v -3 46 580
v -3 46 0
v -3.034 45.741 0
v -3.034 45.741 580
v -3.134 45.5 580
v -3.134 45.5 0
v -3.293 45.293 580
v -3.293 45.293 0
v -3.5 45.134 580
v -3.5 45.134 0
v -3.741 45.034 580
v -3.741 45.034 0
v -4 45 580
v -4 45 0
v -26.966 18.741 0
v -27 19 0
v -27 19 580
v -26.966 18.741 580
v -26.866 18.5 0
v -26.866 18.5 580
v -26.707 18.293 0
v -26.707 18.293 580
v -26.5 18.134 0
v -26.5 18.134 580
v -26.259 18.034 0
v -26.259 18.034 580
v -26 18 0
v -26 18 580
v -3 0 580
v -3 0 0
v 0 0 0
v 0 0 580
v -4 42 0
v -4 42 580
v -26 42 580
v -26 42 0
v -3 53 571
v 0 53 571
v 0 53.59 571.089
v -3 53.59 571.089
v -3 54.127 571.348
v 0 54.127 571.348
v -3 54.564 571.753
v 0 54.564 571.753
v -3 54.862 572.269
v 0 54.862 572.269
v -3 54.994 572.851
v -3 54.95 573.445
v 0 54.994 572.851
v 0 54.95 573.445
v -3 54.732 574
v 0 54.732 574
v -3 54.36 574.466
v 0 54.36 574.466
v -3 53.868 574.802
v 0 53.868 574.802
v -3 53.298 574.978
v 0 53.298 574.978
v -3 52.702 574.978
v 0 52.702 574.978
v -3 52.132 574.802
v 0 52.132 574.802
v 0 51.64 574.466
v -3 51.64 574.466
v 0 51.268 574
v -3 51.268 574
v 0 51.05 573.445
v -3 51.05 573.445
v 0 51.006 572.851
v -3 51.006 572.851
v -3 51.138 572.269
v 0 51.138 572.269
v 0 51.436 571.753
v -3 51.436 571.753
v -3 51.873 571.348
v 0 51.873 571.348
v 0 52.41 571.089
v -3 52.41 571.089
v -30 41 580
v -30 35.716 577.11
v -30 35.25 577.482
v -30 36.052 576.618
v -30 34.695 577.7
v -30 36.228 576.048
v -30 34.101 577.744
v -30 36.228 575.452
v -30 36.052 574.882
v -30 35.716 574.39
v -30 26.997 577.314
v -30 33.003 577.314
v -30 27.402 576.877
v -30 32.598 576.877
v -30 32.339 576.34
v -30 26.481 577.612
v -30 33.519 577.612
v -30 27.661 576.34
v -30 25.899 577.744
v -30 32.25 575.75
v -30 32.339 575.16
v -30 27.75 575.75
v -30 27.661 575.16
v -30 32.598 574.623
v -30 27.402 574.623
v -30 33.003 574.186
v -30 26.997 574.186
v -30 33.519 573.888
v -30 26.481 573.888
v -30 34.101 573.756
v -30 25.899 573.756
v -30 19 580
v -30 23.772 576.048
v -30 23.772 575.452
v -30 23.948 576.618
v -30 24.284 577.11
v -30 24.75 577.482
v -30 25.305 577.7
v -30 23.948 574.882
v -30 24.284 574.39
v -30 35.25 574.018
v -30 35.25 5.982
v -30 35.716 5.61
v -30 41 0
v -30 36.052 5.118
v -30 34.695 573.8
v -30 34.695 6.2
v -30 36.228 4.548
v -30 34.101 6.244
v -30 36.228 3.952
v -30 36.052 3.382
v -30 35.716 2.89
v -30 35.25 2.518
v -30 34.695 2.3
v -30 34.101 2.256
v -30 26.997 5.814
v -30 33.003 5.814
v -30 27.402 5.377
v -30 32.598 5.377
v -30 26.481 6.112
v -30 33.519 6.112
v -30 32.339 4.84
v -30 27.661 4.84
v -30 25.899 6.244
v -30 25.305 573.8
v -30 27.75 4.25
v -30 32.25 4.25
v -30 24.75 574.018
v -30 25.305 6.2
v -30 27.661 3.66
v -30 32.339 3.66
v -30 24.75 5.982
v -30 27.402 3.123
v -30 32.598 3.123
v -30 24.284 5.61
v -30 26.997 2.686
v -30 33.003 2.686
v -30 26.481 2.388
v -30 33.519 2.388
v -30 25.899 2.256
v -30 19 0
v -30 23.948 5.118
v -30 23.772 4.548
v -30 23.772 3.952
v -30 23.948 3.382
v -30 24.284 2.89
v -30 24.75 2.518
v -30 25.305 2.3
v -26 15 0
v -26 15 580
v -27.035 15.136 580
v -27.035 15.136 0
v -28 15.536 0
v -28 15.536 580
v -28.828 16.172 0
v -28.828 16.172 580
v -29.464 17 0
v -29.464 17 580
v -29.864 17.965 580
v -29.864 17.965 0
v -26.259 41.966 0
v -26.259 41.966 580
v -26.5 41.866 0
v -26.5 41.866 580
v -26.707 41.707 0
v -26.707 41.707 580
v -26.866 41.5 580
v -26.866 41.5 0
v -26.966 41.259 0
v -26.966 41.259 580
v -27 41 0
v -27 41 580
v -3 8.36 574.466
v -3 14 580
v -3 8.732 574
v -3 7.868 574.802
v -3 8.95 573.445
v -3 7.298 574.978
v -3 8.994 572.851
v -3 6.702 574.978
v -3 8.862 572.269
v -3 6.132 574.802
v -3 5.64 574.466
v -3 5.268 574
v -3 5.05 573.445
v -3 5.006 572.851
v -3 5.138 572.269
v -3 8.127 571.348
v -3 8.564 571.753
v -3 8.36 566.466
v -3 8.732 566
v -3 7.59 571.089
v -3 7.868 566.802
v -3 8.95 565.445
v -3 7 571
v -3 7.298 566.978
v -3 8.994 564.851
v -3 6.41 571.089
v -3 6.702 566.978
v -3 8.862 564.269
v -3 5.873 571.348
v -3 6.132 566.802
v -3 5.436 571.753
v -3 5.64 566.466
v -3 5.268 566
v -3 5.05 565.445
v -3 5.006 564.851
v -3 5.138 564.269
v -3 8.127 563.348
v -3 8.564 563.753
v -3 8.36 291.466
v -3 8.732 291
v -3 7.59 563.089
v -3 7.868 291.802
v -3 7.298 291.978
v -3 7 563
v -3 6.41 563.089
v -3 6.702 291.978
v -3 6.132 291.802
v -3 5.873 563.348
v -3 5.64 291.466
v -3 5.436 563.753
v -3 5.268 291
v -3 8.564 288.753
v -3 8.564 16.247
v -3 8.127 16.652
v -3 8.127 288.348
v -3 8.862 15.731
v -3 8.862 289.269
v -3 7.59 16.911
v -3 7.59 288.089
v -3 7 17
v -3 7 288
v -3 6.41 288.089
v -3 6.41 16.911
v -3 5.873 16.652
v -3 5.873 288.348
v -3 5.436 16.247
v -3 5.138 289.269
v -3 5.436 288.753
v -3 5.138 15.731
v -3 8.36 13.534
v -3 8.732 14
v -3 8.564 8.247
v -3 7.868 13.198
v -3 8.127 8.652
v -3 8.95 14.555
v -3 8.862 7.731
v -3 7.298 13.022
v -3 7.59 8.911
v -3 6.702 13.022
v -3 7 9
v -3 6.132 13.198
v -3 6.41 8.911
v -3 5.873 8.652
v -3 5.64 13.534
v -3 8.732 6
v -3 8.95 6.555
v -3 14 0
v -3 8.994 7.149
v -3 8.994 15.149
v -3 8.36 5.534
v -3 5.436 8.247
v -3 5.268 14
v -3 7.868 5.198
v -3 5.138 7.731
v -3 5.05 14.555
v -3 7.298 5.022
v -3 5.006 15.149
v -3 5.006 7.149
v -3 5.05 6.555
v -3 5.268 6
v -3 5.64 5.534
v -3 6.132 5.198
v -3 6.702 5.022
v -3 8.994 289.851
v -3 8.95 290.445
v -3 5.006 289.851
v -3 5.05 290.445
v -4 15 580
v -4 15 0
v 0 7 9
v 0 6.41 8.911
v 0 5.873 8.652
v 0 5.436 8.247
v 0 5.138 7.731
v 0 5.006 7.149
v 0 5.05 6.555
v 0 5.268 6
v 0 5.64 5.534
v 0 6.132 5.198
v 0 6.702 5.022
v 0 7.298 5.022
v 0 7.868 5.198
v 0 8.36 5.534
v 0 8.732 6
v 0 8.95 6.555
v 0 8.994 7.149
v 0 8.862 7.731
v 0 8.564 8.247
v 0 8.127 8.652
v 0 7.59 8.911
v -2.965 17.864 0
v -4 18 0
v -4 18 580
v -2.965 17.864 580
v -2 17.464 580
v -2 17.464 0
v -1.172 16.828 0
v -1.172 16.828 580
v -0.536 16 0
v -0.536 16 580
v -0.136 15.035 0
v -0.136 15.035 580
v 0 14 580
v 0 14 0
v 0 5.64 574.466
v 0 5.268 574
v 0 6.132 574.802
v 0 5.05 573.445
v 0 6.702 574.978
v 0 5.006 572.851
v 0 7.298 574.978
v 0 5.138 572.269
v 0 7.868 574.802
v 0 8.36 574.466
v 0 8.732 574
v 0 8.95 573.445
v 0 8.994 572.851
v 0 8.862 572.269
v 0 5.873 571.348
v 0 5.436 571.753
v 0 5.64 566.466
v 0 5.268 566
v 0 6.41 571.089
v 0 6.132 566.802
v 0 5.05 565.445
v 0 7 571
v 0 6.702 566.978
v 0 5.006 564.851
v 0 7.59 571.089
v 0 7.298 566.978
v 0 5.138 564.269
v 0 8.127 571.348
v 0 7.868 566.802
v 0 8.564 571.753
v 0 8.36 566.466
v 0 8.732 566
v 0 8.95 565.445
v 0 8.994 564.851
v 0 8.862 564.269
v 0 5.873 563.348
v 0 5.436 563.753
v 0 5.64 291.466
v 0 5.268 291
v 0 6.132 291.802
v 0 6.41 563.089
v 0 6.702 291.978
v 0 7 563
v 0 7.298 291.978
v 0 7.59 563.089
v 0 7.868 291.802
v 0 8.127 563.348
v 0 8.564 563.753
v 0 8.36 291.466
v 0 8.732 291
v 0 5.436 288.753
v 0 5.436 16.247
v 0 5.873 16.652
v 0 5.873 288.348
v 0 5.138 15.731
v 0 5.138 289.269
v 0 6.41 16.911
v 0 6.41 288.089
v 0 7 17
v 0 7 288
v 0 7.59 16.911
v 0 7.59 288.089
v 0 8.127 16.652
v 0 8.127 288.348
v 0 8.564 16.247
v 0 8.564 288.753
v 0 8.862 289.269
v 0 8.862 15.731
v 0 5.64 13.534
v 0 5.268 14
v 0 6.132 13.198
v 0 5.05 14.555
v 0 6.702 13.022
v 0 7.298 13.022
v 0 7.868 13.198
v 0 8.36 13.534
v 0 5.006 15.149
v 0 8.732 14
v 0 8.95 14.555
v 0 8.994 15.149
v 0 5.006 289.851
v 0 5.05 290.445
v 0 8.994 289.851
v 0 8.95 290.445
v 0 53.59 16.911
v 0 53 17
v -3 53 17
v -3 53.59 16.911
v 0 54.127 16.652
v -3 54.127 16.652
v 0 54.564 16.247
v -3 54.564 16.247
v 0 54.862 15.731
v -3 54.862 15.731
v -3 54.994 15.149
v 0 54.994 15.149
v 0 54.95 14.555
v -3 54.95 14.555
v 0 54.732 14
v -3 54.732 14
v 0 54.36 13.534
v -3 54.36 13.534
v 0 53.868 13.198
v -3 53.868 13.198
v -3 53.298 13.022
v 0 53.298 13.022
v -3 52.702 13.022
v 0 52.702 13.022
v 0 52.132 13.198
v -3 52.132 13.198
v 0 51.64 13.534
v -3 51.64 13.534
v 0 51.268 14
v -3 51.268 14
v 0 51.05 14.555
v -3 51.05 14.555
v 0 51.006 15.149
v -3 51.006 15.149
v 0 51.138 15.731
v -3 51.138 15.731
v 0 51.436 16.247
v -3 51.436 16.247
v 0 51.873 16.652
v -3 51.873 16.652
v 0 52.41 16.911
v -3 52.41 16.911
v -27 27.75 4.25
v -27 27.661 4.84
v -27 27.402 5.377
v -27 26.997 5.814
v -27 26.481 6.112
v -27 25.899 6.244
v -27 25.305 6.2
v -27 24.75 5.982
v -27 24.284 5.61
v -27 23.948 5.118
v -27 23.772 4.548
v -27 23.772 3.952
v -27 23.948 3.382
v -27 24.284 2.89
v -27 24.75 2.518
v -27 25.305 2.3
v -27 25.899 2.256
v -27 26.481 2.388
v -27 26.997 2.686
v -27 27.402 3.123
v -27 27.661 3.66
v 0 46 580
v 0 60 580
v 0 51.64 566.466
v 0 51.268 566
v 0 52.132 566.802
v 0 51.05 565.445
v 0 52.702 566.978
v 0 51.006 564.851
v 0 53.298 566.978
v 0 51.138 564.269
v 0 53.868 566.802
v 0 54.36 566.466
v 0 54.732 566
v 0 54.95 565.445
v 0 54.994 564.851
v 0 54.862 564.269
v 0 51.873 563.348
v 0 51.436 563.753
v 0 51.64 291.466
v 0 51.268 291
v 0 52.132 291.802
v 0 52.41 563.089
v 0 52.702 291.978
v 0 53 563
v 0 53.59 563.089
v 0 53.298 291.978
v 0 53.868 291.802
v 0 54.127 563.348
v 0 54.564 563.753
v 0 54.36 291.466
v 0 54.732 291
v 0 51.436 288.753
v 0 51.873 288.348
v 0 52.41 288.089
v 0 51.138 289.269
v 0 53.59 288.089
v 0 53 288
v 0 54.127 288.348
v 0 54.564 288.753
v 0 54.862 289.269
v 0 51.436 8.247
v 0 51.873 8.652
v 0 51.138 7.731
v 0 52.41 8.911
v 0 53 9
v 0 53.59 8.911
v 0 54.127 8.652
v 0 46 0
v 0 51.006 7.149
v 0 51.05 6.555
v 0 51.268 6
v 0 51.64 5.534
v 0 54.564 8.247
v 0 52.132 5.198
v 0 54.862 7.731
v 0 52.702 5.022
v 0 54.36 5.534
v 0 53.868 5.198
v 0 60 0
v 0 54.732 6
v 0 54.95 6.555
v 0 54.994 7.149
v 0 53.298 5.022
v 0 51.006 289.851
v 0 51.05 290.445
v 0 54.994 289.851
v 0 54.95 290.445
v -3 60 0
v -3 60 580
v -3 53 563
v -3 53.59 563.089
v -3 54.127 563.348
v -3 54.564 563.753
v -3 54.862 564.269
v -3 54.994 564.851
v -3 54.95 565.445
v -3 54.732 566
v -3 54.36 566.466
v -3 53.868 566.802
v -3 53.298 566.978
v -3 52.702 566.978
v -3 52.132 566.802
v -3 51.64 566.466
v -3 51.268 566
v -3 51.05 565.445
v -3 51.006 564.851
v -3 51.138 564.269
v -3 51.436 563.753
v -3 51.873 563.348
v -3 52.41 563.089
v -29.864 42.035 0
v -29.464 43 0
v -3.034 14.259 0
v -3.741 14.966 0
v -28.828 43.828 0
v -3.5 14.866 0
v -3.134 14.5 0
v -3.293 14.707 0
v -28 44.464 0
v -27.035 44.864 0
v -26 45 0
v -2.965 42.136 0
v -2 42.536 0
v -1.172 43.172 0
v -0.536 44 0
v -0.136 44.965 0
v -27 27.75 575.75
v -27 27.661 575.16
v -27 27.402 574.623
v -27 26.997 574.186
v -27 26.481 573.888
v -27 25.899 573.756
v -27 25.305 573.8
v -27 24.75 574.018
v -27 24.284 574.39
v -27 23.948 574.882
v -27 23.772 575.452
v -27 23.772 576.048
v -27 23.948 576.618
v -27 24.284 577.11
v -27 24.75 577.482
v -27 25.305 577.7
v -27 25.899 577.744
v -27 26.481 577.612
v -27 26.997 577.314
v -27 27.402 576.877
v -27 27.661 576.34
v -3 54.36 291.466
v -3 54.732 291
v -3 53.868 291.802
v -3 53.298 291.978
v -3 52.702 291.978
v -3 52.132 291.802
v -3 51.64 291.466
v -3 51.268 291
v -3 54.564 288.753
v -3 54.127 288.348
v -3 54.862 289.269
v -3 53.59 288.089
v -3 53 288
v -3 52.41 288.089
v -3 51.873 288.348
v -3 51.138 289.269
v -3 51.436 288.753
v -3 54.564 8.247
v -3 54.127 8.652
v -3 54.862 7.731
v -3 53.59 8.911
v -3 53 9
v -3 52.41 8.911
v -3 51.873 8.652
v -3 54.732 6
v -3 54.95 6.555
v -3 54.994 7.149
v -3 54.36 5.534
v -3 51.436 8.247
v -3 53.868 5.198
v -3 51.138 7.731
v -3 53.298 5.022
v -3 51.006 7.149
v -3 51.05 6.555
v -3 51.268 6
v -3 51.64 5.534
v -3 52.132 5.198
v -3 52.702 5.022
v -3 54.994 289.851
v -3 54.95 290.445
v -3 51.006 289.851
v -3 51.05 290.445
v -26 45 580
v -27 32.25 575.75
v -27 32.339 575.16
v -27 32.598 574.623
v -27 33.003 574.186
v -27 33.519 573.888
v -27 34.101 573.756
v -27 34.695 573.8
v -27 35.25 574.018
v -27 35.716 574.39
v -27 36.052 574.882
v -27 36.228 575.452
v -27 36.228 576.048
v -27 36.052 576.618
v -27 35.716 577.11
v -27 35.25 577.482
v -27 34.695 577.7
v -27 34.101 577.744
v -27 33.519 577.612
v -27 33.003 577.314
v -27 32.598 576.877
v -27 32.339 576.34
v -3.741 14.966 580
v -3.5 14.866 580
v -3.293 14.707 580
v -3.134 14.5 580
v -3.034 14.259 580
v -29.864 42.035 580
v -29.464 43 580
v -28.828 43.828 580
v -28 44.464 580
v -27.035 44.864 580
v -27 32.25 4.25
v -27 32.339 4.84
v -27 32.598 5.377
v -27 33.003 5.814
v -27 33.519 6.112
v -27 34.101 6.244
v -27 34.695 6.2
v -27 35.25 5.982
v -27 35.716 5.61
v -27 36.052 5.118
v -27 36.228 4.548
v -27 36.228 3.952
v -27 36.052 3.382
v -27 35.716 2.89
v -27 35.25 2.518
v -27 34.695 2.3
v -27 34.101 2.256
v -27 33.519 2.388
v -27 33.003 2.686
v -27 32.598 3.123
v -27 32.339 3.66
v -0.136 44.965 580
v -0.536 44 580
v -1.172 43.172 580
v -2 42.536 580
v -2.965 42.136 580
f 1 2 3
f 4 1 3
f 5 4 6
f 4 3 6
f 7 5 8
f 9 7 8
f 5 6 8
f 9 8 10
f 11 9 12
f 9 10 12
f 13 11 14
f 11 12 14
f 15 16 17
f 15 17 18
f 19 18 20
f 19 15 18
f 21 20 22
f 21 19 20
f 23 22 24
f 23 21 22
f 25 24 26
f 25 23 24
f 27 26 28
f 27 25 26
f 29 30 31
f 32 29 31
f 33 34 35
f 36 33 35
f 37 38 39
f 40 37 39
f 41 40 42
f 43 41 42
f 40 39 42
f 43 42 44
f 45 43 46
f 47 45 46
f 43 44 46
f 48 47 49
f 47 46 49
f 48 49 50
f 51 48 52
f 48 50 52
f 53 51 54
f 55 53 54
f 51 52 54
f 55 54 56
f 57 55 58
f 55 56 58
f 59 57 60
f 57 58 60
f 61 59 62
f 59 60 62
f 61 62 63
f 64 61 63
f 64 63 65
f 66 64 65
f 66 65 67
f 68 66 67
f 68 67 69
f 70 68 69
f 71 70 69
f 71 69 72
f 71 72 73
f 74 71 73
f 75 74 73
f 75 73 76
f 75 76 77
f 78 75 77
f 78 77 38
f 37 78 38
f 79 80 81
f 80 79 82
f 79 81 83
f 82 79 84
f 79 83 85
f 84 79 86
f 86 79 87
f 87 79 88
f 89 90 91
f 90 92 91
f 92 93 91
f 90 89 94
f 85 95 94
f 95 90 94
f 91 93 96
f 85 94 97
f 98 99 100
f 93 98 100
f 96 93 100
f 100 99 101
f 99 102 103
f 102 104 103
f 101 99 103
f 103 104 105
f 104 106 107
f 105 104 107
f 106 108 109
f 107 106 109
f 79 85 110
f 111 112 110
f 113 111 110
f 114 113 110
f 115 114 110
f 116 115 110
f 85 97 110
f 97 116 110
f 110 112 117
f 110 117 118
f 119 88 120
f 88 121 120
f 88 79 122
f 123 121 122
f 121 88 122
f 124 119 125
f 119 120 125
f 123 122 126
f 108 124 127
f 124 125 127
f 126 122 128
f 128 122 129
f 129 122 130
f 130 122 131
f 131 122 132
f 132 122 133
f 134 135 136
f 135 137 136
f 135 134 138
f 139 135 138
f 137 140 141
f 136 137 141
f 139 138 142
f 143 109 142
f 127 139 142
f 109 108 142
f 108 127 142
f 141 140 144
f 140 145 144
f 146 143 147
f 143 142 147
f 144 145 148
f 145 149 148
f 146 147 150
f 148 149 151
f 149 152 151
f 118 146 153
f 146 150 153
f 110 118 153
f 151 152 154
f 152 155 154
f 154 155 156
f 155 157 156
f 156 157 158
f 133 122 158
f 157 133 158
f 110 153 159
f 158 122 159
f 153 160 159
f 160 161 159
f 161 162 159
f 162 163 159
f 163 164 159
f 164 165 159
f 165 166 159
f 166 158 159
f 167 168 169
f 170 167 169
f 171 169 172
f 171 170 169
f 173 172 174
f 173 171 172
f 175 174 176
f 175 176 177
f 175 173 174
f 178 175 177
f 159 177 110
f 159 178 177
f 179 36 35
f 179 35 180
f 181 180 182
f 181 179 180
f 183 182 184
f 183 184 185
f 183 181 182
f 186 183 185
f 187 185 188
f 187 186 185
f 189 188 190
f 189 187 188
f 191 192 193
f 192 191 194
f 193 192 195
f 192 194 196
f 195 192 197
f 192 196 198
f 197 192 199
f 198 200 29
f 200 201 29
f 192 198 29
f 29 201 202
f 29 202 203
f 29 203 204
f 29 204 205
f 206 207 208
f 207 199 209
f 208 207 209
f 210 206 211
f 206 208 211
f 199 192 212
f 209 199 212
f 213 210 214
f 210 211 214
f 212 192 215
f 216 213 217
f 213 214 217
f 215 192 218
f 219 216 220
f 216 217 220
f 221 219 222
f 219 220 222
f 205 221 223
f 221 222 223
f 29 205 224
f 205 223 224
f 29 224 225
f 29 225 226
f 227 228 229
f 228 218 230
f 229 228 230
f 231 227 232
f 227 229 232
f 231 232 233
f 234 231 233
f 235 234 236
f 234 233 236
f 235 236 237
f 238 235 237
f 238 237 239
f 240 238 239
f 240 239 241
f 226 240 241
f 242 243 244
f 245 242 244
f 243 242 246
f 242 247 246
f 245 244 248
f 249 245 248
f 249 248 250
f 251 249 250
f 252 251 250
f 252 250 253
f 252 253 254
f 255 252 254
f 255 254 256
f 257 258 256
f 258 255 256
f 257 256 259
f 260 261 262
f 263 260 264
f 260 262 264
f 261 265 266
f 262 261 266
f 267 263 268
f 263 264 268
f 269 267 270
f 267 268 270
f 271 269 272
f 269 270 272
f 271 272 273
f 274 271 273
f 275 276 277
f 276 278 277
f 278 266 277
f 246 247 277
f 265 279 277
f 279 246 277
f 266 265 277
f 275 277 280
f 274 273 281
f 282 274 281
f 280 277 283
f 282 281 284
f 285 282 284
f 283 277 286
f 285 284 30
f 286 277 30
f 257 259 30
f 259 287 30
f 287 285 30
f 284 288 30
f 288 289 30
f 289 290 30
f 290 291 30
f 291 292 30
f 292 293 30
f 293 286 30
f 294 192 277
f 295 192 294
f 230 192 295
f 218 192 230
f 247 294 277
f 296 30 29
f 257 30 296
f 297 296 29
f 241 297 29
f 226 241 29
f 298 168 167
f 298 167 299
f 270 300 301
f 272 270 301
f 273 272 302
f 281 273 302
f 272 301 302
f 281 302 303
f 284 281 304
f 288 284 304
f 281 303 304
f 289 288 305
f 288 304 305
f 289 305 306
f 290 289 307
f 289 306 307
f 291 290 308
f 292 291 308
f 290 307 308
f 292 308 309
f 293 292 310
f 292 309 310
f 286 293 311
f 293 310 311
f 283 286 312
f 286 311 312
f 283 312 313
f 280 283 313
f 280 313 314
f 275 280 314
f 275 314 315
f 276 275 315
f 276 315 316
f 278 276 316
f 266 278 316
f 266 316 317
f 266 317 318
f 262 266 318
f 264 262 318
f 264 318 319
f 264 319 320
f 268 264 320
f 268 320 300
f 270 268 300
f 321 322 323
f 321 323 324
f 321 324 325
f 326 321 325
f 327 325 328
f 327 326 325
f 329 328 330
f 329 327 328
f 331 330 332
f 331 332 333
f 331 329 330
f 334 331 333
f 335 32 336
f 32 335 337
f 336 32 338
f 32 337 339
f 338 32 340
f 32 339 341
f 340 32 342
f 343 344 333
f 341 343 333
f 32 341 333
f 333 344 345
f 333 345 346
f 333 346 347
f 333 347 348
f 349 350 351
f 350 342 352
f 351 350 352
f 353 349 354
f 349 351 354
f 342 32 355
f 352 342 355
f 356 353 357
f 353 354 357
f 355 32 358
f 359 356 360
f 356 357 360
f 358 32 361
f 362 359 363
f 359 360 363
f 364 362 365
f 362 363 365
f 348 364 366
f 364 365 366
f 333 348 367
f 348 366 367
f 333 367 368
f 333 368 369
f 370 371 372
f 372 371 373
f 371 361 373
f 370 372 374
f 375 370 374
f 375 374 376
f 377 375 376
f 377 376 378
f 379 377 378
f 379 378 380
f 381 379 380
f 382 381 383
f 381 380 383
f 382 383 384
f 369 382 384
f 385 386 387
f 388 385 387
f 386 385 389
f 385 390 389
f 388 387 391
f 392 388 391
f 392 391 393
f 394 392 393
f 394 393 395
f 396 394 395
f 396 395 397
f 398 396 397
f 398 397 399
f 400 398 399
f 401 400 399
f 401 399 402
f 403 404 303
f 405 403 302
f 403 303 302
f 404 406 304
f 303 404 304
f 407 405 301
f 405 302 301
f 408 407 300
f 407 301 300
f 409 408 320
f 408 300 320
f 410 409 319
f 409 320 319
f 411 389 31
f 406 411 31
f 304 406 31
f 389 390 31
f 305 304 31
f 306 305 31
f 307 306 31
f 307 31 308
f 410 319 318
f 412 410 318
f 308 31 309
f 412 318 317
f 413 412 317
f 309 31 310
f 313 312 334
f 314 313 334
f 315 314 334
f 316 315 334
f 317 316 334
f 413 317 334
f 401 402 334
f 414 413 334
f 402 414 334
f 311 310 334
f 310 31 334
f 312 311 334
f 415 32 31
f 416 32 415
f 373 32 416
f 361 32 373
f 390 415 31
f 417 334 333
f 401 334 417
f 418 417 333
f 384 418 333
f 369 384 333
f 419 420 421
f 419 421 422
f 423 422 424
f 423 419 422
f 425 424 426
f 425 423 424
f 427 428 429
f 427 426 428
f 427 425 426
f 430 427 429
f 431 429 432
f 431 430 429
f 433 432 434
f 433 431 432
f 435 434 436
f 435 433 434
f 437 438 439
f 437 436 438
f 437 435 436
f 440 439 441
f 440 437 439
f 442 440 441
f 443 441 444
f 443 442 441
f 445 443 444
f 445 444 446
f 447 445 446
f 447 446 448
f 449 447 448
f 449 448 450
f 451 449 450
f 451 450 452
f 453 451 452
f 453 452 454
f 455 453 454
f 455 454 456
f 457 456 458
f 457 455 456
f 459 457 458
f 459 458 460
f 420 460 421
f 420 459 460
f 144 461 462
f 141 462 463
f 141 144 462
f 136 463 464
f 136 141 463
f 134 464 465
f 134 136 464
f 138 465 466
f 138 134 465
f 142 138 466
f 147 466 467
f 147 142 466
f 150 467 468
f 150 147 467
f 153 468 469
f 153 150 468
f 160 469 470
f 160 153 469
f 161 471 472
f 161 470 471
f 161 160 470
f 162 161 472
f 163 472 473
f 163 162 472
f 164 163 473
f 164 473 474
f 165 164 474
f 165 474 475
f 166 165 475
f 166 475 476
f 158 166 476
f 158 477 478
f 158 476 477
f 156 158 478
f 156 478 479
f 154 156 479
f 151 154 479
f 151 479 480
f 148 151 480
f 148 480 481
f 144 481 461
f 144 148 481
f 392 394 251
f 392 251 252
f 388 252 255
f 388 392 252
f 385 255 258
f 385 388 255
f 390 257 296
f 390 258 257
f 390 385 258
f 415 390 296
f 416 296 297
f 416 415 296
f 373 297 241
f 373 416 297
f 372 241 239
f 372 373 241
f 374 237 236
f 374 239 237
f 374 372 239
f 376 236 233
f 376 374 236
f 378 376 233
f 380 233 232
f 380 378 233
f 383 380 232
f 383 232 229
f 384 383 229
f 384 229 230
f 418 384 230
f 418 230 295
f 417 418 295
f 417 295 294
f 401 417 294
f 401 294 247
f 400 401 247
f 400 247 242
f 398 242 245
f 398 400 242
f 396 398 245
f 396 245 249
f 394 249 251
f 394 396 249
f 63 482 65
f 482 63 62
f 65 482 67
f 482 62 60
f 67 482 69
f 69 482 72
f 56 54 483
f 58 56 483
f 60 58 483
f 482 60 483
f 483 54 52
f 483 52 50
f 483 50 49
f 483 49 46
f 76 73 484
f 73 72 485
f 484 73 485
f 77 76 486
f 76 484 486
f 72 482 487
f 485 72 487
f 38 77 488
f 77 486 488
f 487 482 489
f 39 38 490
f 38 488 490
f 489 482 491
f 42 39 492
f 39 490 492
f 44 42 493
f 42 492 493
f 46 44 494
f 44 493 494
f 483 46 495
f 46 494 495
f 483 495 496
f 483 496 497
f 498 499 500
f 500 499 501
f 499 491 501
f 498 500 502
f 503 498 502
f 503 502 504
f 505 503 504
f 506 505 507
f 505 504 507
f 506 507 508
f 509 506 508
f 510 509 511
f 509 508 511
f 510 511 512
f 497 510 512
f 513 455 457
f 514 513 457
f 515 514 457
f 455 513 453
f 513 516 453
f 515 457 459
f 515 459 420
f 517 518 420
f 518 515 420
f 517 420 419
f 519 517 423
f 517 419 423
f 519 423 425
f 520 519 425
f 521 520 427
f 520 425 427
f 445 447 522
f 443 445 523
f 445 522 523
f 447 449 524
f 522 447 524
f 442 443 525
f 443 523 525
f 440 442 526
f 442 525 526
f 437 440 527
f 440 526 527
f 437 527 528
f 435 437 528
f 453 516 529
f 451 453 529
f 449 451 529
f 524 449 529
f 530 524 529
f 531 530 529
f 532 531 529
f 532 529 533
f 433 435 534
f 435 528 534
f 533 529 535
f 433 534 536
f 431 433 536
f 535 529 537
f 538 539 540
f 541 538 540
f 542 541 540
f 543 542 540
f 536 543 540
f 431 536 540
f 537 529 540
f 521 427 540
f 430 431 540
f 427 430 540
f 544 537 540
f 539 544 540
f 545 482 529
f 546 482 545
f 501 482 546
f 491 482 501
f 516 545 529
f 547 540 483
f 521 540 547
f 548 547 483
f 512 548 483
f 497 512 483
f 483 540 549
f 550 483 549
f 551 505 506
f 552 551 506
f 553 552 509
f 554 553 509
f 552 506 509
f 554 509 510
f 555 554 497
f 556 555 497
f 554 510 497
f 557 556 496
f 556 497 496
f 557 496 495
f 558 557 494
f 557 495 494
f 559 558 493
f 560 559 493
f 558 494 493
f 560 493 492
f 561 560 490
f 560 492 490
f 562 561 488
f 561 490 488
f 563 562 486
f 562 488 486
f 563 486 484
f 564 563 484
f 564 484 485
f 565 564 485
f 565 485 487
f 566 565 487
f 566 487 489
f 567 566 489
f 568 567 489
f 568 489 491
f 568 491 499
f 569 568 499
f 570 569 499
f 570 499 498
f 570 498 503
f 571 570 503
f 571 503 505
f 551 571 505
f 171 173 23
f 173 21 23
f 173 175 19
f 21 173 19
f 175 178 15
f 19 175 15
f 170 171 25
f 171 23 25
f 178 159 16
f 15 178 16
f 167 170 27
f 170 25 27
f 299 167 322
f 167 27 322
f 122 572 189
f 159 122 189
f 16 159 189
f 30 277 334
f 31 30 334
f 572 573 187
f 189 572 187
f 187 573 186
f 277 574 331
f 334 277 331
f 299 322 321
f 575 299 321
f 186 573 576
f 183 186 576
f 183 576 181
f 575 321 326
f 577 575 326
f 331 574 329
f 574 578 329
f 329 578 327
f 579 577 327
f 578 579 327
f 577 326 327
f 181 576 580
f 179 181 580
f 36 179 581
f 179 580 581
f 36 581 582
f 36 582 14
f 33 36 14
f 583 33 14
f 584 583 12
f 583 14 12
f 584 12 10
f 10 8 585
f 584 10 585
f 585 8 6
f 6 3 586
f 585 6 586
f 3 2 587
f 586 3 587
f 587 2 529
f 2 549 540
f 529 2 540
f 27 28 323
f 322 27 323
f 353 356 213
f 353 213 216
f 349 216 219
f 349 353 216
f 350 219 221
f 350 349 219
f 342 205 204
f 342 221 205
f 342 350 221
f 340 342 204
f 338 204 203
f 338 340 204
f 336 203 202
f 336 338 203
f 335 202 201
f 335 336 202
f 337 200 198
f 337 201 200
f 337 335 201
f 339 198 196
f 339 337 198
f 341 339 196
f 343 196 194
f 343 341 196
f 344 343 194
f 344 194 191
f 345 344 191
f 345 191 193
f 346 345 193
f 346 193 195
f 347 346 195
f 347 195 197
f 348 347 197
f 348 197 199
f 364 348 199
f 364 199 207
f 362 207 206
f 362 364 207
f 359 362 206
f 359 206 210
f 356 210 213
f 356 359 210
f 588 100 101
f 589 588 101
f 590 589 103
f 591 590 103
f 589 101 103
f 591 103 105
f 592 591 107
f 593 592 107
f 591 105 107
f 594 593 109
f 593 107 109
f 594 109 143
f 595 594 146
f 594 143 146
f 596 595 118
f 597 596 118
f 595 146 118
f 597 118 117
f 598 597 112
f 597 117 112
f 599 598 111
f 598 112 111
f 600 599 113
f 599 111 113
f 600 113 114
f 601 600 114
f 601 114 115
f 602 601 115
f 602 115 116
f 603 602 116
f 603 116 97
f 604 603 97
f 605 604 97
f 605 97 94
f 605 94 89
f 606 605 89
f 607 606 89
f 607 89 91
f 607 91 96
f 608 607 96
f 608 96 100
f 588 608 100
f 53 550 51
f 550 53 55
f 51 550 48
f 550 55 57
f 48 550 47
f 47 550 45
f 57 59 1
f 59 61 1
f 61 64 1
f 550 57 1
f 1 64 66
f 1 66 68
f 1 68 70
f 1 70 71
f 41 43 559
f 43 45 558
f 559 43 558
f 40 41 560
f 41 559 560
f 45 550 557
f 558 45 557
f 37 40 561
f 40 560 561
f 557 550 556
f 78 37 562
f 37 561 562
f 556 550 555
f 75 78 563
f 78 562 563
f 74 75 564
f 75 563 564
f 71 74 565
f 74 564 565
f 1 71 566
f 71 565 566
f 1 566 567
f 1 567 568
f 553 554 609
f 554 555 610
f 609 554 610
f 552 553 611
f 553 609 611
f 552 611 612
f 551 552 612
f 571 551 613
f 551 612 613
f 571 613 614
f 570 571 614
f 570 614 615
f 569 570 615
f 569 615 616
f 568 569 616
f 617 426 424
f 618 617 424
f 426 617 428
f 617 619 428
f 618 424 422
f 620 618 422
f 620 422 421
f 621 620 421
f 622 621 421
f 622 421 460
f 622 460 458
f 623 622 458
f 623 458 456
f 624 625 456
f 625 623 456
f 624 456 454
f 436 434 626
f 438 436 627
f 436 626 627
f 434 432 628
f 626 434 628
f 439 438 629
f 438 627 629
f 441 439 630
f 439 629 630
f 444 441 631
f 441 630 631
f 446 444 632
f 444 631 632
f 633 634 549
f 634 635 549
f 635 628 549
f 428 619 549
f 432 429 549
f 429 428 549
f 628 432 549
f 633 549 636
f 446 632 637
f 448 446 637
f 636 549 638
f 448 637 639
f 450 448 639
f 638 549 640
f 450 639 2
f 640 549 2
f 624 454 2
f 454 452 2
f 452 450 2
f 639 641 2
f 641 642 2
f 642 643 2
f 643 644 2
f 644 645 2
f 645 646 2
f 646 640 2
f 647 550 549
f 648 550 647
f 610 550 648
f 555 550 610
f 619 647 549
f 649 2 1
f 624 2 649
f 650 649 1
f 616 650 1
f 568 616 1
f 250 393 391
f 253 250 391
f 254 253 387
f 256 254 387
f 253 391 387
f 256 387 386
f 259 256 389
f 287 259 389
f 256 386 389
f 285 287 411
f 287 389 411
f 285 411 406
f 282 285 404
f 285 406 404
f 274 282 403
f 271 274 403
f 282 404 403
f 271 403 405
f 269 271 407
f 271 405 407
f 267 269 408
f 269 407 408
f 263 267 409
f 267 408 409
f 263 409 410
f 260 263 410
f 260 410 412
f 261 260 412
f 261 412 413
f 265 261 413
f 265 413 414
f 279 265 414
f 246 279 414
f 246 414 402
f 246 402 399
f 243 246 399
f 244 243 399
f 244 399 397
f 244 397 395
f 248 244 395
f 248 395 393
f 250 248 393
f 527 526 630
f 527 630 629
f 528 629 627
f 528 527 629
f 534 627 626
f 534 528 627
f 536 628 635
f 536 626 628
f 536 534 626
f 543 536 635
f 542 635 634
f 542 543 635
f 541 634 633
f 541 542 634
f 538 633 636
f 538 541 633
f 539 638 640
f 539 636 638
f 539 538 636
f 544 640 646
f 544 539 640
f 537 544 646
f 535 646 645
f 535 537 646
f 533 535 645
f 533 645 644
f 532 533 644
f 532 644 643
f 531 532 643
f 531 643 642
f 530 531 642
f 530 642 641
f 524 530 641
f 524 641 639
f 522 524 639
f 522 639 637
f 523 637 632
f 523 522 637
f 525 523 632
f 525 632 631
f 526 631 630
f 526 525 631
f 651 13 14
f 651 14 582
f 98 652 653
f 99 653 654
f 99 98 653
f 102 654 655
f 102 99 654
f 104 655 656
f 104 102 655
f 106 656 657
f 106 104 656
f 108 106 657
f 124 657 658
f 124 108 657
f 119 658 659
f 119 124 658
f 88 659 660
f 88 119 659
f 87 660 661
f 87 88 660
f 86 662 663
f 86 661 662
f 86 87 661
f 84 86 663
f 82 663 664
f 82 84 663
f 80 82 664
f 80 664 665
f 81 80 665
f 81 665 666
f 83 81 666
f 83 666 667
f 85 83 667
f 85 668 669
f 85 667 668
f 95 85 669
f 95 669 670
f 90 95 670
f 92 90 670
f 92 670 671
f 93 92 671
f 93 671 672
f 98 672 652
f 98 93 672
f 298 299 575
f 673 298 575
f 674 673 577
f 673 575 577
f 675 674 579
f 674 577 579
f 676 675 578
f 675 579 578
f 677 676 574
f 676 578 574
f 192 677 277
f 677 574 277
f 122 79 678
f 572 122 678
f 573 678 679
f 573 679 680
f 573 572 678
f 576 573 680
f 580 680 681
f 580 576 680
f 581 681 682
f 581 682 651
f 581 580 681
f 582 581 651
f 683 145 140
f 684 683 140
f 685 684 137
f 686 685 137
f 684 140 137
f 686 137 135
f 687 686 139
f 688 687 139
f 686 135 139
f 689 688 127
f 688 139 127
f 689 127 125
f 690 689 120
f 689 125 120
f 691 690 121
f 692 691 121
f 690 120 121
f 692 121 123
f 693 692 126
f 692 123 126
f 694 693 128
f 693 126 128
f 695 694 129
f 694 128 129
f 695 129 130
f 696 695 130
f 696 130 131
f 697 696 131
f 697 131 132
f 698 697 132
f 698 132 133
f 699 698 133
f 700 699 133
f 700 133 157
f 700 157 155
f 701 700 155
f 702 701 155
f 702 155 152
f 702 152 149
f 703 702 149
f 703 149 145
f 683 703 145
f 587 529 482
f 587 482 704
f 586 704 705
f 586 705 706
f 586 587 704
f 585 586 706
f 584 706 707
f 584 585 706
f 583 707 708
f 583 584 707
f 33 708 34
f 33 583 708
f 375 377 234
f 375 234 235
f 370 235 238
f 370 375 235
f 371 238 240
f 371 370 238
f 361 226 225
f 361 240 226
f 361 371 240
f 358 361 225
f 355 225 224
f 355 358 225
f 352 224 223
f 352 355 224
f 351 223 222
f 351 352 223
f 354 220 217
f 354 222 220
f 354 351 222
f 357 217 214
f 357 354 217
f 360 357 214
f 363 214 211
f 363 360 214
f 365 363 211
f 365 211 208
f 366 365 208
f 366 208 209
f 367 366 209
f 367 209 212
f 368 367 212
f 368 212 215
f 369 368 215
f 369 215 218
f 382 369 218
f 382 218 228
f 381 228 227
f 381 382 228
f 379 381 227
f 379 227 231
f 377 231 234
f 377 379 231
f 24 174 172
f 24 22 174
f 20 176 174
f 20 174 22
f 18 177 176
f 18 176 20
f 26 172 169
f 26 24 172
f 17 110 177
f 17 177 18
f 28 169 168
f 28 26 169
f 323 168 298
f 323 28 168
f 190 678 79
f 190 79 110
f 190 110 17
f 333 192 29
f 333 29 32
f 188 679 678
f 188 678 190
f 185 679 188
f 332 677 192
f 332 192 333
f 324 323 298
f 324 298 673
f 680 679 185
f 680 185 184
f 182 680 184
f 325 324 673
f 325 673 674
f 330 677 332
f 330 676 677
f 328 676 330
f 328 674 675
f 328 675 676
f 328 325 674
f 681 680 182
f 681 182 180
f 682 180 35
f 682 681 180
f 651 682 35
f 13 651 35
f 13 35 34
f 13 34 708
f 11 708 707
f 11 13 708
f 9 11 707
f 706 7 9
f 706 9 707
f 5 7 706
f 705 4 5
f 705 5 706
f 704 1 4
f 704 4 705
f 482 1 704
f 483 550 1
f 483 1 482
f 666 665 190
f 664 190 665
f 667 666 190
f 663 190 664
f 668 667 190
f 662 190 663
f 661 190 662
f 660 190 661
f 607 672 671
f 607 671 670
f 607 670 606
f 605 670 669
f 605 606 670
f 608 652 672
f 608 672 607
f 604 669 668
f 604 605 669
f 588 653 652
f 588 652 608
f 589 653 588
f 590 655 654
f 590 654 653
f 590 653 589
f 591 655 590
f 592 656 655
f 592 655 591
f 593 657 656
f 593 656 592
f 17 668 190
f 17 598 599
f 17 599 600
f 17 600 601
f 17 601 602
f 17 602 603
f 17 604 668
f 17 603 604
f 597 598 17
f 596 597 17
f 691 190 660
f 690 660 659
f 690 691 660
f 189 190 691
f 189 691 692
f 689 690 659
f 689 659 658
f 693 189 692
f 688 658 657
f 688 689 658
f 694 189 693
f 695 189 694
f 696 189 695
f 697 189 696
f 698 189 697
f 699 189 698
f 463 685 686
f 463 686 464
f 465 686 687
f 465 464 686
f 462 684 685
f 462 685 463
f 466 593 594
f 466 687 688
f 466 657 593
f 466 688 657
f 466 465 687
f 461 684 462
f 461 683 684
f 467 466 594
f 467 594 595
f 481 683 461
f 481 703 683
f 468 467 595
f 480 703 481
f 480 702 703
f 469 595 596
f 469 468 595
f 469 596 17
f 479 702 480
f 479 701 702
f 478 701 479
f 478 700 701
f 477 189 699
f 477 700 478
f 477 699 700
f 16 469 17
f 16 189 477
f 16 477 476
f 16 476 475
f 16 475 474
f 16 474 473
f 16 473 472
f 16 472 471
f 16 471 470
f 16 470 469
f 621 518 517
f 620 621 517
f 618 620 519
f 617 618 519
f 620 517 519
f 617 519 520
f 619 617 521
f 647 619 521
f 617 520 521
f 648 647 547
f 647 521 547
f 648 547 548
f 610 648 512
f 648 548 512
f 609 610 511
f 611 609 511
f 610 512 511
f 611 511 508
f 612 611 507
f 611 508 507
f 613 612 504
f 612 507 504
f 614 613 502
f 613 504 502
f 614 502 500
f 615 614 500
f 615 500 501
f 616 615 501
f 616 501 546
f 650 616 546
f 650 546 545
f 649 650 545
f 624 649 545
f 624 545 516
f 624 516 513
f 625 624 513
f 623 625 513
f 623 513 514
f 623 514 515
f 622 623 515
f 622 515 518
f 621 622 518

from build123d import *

# Parameters (mm, degrees)
DODANIE_WYCI_GNI_CIE1_DEPTH = 580
KONWERTUJ_BRY_1_DEPTH       = 580
KONWERTUJ_BRY_1_2_DEPTH     = 580
OTW_R1_D                    = 4
LUSTRO2_COPY_1_D            = 4
OTW_R2_D                    = 4
SZKIC7_R                    = 2
WYTNIJ_WYCI_GNI_CIE1_DEPTH  = 584.86642308
LUSTRO5_COPY_1_SKETCH_R     = 2
LUSTRO5_COPY_1_DEPTH        = 584.86642308


# Read off the part's stored shape, not the designer's step: Konwertuj bryłę1
with BuildPart() as part:
    # Szkic2 → Dodanie-wyciągnięcie1 (new body)
    with BuildSketch(Plane.XY):
        Polygon((0, 0), (0, 30), (0, 60), (-3, 60), (-3, 45), (-30, 45), (-30, 30), (-30, 15), (-3, 15), (-3, 0), align=None)
    extrude(amount=DODANIE_WYCI_GNI_CIE1_DEPTH)

    # Konwertuj bryłę1 outline → Konwertuj bryłę1 (cut)
    with BuildSketch(Plane.XY):
        with BuildLine():
            Line((-30, 45), (-30, 41))
            ThreePointArc((-30, 41), (-28.828427125, 43.828427125), (-26, 45))
            Line((-26, 45), (-30, 45))
        make_face()
        with BuildLine():
            Line((-30, 15), (-26, 15))
            ThreePointArc((-26, 15), (-28.828427125, 16.171572875), (-30, 19))
            Line((-30, 19), (-30, 15))
        make_face()
        with BuildLine():
            Line((-26, 18), (-4, 18))
            ThreePointArc((-4, 18), (-1.171572875, 16.828427125), (0, 14))
            Line((0, 14), (0, 46))
            ThreePointArc((0, 46), (-1.171572875, 43.171572875), (-4, 42))
            Line((-4, 42), (-26, 42))
            ThreePointArc((-26, 42), (-26.707106781, 41.707106781), (-27, 41))
            Line((-27, 41), (-27, 19))
            ThreePointArc((-27, 19), (-26.707106781, 18.292893219), (-26, 18))
        make_face()
    extrude(amount=KONWERTUJ_BRY_1_DEPTH, mode=Mode.SUBTRACT)

    # Konwertuj bry_1 2 outline → Konwertuj bry_1 2 (add)
    with BuildSketch(Plane.XY):
        with BuildLine():
            ThreePointArc((-3, 46), (-3.292893219, 45.292893219), (-4, 45))
            Line((-4, 45), (-3, 45))
            Line((-3, 45), (-3, 46))
        make_face()
        with BuildLine():
            ThreePointArc((-4, 15), (-3.292893219, 14.707106781), (-3, 14))
            Line((-3, 14), (-3, 15))
            Line((-3, 15), (-4, 15))
        make_face()
    extrude(amount=KONWERTUJ_BRY_1_2_DEPTH)

    # Otwór1 (through all)
    with Locations(Plane.ZY.offset(3)):
        with Locations((573, 53), (565, 53)):
            otw_r1 = Hole(OTW_R1_D / 2)

    # Lustro1: Otwór1 across plane
    add(otw_r1.mirror(Plane(origin=(0, 30, 0), x_dir=(0, 0, 1), z_dir=(0, -1, 0))), mode=Mode.SUBTRACT)

    # Lustro2: Otwór1 across plane
    add(otw_r1.mirror(Plane.XY.offset(290)), mode=Mode.SUBTRACT)

    # Lustro2 copy 1 (through all)
    with Locations(Plane(origin=(-3, 60, 580), x_dir=(0, 0, -1), z_dir=(-1, 0, 0))):
        with Locations((573, 53), (565, 53)):
            Hole(LUSTRO2_COPY_1_D / 2)

    # Otwór2 (through all)
    with Locations(Plane.ZY.offset(3)):
        with Locations((290, 53)):
            otw_r2 = Hole(OTW_R2_D / 2)

    # Lustro3: Otwór2 across plane
    add(otw_r2.mirror(Plane(origin=(0, 30, 0), x_dir=(0, 0, 1), z_dir=(0, -1, 0))), mode=Mode.SUBTRACT)

    # Szkic7 → Wytnij-wyciągnięcie1 (cut, through all)
    with BuildSketch(Plane.ZY.offset(30)):
        with Locations(Location((4.25, 34.25, 0), (0, 0, 270))):
            Circle(SZKIC7_R)
    wytnij_wyci_gni_cie1 = extrude(amount=-WYTNIJ_WYCI_GNI_CIE1_DEPTH, mode=Mode.SUBTRACT)

    # Lustro4: Wytnij-wyciągnięcie1 across plane
    add(wytnij_wyci_gni_cie1.mirror(Plane.XY.offset(290)), mode=Mode.SUBTRACT)

    # Lustro5: Wytnij-wyciągnięcie1 across plane
    add(wytnij_wyci_gni_cie1.mirror(Plane(origin=(0, 30, 0), x_dir=(0, 0, 1), z_dir=(0, -1, 0))), mode=Mode.SUBTRACT)

    # Lustro5 copy 1 sketch → Lustro5 copy 1 (cut, through all)
    with BuildSketch(Plane(origin=(-30, 60, 580), x_dir=(0, 0, -1), z_dir=(-1, 0, 0))):
        with Locations(Location((4.25, 34.25, 0), (0, 0, 270))):
            Circle(LUSTRO5_COPY_1_SKETCH_R)
    extrude(amount=-LUSTRO5_COPY_1_DEPTH, mode=Mode.SUBTRACT)


solid = part.part
